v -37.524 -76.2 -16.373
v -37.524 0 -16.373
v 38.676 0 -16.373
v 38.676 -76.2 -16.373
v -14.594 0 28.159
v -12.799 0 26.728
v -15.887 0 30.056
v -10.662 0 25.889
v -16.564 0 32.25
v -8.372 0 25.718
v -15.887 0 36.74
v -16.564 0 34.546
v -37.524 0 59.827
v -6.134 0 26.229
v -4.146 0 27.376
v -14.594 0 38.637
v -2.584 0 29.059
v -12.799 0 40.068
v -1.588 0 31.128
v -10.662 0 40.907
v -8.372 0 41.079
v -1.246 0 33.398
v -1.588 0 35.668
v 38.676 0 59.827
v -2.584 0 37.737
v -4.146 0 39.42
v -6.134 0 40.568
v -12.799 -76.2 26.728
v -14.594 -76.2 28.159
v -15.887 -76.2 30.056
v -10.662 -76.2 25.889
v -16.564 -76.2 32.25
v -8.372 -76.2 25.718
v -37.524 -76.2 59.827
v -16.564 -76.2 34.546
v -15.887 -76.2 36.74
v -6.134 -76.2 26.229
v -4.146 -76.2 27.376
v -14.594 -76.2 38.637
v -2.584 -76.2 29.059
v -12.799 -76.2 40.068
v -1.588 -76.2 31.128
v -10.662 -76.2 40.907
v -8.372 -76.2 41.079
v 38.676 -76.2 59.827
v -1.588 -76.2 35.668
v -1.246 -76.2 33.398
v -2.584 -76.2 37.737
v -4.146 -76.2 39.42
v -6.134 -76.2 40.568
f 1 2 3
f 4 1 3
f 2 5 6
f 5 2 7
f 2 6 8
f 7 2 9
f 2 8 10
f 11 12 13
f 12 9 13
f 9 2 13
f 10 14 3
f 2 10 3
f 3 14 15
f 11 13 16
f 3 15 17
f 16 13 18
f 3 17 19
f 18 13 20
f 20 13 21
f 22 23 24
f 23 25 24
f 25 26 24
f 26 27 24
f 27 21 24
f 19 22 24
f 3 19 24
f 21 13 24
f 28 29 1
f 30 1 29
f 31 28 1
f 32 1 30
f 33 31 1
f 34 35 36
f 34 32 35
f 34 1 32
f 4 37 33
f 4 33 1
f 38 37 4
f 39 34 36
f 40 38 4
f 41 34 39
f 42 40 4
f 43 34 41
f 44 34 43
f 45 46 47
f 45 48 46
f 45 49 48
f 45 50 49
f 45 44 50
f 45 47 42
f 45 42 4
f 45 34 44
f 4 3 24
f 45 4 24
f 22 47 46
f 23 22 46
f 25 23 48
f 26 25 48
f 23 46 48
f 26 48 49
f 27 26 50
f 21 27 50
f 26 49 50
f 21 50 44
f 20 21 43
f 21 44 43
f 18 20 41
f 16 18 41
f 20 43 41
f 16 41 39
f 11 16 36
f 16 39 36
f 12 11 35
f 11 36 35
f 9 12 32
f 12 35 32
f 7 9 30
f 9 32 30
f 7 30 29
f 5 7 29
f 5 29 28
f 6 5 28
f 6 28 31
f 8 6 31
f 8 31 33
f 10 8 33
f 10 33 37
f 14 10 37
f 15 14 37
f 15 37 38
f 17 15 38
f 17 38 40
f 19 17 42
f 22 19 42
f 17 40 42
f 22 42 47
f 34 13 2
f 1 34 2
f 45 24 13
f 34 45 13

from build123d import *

# Parameters (mm, degrees)
F1_DEPTH = 76.2
F2_R     = 7.702083685
F3_DEPTH = 76.2


# Not quite as in the source:
# - a feature names something its author has since deleted; it is built from what else it names


with BuildPart() as f1:
    # F0 (on Front) → F1 (new body)
    with BuildSketch(Plane.XZ):
        Polygon((-37.524404479, 59.8273601898), (-37.524404479, -16.3726398102), (38.675595521, -16.3726398102), (38.675595521, 59.8273601898), (35.8841840983, 59.8273601898), align=None)
    extrude(amount=F1_DEPTH)

    # F2 (on face) → F3 (cut)
    with BuildSketch(Plane.XZ.offset(76.2)):
        with Locations((-8.9478027076, 33.3981923759)):
            Circle(F2_R)
    extrude(amount=-F3_DEPTH, mode=Mode.SUBTRACT)


solid = f1.part
